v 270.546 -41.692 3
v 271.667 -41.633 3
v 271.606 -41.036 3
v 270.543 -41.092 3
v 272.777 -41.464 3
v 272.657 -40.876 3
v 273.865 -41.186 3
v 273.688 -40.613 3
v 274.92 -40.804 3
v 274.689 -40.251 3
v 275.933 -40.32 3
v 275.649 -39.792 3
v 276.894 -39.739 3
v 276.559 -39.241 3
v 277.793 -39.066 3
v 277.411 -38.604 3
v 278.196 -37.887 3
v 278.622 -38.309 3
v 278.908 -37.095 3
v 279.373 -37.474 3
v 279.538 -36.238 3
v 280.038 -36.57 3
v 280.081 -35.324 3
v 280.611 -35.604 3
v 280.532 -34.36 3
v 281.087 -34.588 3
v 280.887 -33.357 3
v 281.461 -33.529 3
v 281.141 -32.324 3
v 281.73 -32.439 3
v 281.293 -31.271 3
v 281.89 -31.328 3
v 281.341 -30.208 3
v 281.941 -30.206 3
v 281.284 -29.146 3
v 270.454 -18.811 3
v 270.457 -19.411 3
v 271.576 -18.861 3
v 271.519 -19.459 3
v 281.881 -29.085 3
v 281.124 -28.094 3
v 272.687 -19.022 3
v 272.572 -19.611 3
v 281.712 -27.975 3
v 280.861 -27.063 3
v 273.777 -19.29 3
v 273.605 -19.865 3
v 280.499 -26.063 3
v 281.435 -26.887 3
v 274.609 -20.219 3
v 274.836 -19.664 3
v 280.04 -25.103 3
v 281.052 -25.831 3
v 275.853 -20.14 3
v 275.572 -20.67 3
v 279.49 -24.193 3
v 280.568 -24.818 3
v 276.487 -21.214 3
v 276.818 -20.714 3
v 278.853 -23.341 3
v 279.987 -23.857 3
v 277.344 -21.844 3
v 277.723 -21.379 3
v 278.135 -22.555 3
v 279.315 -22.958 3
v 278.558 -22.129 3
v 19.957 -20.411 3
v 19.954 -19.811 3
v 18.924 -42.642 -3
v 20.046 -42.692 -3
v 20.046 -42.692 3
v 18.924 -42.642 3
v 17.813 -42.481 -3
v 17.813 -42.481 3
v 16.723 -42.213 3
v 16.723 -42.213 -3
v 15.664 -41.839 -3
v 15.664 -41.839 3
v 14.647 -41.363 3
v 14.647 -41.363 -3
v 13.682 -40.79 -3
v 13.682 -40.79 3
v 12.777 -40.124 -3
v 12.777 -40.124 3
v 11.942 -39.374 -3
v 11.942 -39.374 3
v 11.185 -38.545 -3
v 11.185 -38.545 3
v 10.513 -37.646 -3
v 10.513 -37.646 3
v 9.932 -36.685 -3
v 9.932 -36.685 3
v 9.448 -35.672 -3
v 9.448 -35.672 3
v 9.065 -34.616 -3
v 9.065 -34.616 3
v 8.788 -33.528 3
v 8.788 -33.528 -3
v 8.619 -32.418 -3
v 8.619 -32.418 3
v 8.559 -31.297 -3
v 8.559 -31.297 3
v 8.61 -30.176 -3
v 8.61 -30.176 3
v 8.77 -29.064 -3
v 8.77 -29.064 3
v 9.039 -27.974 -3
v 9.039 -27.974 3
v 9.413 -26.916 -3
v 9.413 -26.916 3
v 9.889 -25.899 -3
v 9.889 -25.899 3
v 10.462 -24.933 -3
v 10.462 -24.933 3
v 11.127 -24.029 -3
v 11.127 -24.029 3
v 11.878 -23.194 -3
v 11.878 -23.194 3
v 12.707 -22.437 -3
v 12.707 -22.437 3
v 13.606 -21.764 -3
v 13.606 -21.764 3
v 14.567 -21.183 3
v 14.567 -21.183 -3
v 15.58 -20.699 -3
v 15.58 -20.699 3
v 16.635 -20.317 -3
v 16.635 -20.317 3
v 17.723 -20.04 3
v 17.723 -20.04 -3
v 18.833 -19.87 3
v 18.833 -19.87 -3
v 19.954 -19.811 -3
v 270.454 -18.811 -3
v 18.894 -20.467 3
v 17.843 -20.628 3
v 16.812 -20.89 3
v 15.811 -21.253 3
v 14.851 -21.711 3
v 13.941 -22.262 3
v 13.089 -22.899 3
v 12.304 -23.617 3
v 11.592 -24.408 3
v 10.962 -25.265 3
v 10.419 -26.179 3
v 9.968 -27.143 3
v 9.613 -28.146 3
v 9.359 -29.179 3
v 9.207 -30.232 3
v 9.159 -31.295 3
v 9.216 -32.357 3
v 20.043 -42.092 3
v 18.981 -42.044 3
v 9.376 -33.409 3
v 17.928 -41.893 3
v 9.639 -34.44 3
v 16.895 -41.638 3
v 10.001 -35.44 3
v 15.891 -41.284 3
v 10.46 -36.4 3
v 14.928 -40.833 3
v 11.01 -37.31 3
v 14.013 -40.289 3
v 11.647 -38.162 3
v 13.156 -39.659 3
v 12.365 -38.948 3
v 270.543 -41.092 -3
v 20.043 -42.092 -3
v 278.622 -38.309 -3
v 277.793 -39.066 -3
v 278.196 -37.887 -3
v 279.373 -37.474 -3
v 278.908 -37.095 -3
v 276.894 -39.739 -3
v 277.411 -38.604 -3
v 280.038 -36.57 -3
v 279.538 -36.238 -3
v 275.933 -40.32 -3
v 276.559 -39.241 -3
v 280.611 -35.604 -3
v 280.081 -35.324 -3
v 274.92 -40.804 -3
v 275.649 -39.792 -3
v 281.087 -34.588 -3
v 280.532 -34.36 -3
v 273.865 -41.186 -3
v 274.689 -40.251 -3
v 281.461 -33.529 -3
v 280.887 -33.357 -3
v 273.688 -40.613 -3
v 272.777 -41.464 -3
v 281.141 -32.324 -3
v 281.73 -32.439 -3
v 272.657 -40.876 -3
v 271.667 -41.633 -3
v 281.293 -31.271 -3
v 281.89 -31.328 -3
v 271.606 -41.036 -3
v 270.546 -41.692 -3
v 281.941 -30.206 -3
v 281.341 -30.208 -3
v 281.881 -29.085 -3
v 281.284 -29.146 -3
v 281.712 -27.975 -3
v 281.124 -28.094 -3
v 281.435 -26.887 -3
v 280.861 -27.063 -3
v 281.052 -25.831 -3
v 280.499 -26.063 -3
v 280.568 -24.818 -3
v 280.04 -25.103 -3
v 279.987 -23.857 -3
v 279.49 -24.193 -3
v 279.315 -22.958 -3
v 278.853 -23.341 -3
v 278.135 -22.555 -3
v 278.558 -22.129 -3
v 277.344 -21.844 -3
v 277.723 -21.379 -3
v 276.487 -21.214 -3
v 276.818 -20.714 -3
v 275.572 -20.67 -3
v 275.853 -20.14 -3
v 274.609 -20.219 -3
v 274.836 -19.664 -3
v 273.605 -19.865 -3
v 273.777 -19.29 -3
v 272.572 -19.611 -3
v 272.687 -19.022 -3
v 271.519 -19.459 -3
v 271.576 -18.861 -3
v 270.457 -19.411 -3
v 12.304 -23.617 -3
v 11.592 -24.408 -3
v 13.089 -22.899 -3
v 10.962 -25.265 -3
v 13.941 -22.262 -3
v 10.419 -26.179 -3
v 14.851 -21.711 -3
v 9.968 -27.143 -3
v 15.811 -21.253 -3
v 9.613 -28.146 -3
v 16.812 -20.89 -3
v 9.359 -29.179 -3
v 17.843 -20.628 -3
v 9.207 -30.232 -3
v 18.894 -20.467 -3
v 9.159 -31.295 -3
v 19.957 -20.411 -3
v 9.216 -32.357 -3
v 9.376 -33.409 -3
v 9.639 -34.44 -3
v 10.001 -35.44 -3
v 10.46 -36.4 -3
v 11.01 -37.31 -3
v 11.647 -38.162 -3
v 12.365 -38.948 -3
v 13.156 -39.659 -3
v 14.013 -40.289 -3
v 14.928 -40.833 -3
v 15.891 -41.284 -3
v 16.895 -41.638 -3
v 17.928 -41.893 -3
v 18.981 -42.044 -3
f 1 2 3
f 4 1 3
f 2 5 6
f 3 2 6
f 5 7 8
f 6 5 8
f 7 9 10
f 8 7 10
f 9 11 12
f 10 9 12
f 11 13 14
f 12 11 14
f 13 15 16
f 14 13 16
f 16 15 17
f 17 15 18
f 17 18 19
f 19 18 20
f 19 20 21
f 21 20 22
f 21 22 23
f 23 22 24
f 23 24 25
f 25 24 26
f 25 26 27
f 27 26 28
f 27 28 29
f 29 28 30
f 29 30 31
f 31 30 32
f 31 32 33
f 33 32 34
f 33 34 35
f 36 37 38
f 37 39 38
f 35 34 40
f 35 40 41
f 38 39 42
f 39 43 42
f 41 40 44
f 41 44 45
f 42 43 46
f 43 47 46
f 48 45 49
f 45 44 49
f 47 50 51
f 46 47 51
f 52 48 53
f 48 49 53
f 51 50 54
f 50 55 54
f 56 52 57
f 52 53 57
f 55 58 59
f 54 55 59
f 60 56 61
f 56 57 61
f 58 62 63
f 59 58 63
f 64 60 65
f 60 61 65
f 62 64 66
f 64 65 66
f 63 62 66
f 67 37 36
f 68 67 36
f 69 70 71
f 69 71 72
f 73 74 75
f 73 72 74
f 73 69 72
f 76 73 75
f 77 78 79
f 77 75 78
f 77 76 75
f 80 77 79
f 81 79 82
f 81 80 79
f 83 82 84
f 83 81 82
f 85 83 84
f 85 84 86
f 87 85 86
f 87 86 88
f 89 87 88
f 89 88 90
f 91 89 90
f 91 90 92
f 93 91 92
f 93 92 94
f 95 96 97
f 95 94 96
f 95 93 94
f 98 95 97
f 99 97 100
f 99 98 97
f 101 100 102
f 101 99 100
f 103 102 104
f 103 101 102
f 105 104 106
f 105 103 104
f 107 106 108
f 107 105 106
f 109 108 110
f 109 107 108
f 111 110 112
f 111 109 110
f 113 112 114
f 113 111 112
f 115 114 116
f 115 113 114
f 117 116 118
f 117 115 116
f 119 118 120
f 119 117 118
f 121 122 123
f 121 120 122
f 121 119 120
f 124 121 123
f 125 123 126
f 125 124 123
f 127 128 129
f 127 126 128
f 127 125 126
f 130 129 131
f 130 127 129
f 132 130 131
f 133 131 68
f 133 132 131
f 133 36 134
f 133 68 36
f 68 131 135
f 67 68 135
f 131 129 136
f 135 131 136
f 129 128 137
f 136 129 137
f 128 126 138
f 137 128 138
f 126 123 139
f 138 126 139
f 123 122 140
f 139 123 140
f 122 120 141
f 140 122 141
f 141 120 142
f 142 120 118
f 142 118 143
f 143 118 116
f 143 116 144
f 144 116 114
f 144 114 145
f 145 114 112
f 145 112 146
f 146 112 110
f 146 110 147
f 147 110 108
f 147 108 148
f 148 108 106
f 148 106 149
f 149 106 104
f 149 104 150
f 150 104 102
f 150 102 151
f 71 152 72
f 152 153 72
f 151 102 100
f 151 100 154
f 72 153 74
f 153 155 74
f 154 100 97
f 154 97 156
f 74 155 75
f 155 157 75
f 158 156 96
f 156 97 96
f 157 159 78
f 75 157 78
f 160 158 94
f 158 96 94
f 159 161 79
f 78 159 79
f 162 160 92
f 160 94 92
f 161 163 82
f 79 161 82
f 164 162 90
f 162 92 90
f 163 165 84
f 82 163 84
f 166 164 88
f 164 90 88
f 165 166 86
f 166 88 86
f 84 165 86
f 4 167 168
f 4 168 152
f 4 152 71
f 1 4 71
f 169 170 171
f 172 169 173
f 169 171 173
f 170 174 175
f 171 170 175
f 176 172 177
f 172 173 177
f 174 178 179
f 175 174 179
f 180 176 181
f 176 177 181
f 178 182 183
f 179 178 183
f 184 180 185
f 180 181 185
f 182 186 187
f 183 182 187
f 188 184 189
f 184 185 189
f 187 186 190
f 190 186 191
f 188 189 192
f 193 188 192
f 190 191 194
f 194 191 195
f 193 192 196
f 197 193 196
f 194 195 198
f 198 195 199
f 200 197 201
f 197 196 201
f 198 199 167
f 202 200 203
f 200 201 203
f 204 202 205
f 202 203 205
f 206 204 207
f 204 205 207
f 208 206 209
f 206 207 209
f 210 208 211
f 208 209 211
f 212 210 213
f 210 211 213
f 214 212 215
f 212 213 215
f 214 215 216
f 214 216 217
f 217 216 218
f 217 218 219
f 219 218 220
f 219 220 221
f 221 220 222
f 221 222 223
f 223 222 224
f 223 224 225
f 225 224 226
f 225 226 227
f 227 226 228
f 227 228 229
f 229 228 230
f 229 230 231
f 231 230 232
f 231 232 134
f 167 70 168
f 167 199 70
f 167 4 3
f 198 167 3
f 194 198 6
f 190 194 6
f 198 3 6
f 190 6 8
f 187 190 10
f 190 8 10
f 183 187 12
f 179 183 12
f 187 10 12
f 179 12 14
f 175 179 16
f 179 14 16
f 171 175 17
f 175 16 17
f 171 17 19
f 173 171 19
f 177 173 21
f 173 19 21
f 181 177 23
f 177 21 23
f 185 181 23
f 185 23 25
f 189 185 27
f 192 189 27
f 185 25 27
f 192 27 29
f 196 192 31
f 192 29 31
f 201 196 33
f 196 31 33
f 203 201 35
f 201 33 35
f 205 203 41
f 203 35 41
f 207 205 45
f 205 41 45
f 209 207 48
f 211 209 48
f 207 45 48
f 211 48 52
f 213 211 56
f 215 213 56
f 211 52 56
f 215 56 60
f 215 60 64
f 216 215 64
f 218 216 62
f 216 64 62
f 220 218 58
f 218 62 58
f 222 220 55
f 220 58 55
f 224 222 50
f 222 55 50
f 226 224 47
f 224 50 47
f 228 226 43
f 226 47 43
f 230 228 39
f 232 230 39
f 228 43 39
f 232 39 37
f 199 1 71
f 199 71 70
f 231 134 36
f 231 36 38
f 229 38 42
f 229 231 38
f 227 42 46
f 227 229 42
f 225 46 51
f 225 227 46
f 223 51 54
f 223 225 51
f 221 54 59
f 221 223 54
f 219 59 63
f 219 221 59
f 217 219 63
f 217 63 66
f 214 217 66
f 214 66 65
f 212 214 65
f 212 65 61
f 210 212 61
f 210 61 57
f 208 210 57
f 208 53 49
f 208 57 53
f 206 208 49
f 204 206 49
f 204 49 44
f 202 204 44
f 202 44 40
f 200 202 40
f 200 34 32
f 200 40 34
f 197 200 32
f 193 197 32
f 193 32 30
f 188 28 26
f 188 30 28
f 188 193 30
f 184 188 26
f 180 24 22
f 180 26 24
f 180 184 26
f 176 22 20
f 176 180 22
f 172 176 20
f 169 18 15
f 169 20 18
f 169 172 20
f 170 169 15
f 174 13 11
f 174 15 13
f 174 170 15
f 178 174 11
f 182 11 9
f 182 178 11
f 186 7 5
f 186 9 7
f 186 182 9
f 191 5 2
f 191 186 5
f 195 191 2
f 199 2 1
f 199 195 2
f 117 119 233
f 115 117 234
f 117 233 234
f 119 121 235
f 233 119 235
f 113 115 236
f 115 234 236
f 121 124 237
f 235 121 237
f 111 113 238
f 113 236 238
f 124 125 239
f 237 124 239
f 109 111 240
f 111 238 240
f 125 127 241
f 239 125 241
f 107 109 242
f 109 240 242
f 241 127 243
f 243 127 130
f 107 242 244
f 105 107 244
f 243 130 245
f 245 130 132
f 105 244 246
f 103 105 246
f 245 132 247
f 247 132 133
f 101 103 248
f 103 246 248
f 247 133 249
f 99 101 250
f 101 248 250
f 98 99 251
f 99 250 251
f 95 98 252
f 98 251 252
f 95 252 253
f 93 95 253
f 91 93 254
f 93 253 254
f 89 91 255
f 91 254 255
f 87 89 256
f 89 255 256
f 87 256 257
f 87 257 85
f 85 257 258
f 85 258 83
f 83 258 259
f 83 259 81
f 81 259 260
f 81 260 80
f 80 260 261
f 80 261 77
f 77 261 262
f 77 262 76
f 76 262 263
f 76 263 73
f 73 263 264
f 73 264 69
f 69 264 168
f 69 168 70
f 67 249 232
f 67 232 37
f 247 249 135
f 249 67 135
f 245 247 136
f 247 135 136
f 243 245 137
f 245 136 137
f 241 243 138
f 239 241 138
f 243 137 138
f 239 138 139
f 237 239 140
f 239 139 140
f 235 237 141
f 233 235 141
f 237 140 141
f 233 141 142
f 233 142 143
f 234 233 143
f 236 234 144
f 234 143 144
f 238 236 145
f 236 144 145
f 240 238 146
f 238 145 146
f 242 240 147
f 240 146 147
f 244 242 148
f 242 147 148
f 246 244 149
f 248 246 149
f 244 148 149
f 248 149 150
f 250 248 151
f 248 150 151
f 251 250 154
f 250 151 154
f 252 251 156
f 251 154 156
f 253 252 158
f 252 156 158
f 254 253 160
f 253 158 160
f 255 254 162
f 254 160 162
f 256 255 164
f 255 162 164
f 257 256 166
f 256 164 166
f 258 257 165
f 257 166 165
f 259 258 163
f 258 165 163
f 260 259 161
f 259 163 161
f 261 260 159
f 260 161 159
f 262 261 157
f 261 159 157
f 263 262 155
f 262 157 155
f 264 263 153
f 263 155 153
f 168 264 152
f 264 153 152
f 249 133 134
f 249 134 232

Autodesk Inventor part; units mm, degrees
sketch "Sketch Path" plane through (0, 0, 0) normal (0, 0, 1) x (1, 0, 0)
  arc A0 (19.9555, -20.1108) -> (20.0445, -42.3924) centre (20, -31.2516) ccw
  arc A1 (270.5445, -41.3924) -> (270.4555, -19.1108) centre (270.5, -30.2516) ccw
  line L0 (270.5445, -41.3924) -> (20.0445, -42.3924)
  line L1 (19.9555, -20.1108) -> (270.4555, -19.1108)
  point P0 (10.0164, 35.326)
  point P1 (9.9836, 27.3683)
  point P2 (270.4836, 26.296)
  point P3 (270.5164, 34.2537)
  point P4 (9.9836, -27.3683)
  point P5 (10.0164, -35.326)
  point P6 (270.5164, -34.2537)
  point P7 (270.4836, -26.296)
  point P8 (20.2708, -20.2096)
  point P9 (20.3662, -42.482)
  point P10 (270.6308, -34.2516)
  point P11 (270.5967, -26.2972)
  point P12 (19.9523, -20.2064)
  point P13 (20.0477, -42.4879)
  point P14 (270.5477, -41.4156)
  point P15 (270.4523, -19.1341)
ref_plane "Cross Section Plane" through (20.0445, -42.3924, 0) normal (1, 0.004, 0) x (0, 0, 1)
ref_plane "Work Plane2" through (20, -31.2516, 0) normal (-1, 0, 0) x (0, 0, 1)
ref_plane "Work Plane3" through (270.5, -30.2516, 0) normal (-0.984, 0.1784, 0) x (0, 0, 1)
ref_plane "Work Plane4" through (20, -42.488, 0) normal (0, 0, -1) x (-1, 0, 0)
sketch3d "Sketch3"
feature "iSBeltToothT:1" [suppressed]
pattern_linear "Rectangular Pattern1" [suppressed]
sketch "Cross Section" plane through (20.0445, -42.3924, 0) normal (1, 0.004, 0) x (0, 0, 1)
  line L0 (-3, 0.3) -> (3, 0.3)
  line L1 (3, 0.3) -> (3, -0.3)
  line L2 (3, -0.3) -> (-3, -0.3)
  line L3 (-3, -0.3) -> (-3, 0.3)
  line L4 (-3, 0) -> (3, 0) construction
  point P0 (0, 0)
  point P1 (0, 0)
  dimension "d0" = 6
  dimension "d4" = 0.3
  dimension "d5" = 0.3
sweep "Belt" add profiles "Cross Section" path "Sketch Path"
fillet "Fillet1" [suppressed]
equation "\"d0\" = da_B"
equation "\"d4\" = da_a"
equation "\"d5\" = da_a2"
equation "\"d21\" = d13"
equation "\"d20\" = da_pb"
equation "\"da_B\" = 6"
equation "\"da_pb\" = 2.5"
equation "\"da_L\" = 571.00399"
equation "\"da_a\" = 0.3"
equation "\"da_S\" = 1.5"
equation "\"da_Beta\" = 20deg"
equation "\"da_Ht\" = 0.7"
equation "\"da_H\" = 1.3"
equation "\"da_a2\" = 0.3"
equation "\"d13\" = 0.2"
properties part number "Synchronous Belt" material "Rubber"
